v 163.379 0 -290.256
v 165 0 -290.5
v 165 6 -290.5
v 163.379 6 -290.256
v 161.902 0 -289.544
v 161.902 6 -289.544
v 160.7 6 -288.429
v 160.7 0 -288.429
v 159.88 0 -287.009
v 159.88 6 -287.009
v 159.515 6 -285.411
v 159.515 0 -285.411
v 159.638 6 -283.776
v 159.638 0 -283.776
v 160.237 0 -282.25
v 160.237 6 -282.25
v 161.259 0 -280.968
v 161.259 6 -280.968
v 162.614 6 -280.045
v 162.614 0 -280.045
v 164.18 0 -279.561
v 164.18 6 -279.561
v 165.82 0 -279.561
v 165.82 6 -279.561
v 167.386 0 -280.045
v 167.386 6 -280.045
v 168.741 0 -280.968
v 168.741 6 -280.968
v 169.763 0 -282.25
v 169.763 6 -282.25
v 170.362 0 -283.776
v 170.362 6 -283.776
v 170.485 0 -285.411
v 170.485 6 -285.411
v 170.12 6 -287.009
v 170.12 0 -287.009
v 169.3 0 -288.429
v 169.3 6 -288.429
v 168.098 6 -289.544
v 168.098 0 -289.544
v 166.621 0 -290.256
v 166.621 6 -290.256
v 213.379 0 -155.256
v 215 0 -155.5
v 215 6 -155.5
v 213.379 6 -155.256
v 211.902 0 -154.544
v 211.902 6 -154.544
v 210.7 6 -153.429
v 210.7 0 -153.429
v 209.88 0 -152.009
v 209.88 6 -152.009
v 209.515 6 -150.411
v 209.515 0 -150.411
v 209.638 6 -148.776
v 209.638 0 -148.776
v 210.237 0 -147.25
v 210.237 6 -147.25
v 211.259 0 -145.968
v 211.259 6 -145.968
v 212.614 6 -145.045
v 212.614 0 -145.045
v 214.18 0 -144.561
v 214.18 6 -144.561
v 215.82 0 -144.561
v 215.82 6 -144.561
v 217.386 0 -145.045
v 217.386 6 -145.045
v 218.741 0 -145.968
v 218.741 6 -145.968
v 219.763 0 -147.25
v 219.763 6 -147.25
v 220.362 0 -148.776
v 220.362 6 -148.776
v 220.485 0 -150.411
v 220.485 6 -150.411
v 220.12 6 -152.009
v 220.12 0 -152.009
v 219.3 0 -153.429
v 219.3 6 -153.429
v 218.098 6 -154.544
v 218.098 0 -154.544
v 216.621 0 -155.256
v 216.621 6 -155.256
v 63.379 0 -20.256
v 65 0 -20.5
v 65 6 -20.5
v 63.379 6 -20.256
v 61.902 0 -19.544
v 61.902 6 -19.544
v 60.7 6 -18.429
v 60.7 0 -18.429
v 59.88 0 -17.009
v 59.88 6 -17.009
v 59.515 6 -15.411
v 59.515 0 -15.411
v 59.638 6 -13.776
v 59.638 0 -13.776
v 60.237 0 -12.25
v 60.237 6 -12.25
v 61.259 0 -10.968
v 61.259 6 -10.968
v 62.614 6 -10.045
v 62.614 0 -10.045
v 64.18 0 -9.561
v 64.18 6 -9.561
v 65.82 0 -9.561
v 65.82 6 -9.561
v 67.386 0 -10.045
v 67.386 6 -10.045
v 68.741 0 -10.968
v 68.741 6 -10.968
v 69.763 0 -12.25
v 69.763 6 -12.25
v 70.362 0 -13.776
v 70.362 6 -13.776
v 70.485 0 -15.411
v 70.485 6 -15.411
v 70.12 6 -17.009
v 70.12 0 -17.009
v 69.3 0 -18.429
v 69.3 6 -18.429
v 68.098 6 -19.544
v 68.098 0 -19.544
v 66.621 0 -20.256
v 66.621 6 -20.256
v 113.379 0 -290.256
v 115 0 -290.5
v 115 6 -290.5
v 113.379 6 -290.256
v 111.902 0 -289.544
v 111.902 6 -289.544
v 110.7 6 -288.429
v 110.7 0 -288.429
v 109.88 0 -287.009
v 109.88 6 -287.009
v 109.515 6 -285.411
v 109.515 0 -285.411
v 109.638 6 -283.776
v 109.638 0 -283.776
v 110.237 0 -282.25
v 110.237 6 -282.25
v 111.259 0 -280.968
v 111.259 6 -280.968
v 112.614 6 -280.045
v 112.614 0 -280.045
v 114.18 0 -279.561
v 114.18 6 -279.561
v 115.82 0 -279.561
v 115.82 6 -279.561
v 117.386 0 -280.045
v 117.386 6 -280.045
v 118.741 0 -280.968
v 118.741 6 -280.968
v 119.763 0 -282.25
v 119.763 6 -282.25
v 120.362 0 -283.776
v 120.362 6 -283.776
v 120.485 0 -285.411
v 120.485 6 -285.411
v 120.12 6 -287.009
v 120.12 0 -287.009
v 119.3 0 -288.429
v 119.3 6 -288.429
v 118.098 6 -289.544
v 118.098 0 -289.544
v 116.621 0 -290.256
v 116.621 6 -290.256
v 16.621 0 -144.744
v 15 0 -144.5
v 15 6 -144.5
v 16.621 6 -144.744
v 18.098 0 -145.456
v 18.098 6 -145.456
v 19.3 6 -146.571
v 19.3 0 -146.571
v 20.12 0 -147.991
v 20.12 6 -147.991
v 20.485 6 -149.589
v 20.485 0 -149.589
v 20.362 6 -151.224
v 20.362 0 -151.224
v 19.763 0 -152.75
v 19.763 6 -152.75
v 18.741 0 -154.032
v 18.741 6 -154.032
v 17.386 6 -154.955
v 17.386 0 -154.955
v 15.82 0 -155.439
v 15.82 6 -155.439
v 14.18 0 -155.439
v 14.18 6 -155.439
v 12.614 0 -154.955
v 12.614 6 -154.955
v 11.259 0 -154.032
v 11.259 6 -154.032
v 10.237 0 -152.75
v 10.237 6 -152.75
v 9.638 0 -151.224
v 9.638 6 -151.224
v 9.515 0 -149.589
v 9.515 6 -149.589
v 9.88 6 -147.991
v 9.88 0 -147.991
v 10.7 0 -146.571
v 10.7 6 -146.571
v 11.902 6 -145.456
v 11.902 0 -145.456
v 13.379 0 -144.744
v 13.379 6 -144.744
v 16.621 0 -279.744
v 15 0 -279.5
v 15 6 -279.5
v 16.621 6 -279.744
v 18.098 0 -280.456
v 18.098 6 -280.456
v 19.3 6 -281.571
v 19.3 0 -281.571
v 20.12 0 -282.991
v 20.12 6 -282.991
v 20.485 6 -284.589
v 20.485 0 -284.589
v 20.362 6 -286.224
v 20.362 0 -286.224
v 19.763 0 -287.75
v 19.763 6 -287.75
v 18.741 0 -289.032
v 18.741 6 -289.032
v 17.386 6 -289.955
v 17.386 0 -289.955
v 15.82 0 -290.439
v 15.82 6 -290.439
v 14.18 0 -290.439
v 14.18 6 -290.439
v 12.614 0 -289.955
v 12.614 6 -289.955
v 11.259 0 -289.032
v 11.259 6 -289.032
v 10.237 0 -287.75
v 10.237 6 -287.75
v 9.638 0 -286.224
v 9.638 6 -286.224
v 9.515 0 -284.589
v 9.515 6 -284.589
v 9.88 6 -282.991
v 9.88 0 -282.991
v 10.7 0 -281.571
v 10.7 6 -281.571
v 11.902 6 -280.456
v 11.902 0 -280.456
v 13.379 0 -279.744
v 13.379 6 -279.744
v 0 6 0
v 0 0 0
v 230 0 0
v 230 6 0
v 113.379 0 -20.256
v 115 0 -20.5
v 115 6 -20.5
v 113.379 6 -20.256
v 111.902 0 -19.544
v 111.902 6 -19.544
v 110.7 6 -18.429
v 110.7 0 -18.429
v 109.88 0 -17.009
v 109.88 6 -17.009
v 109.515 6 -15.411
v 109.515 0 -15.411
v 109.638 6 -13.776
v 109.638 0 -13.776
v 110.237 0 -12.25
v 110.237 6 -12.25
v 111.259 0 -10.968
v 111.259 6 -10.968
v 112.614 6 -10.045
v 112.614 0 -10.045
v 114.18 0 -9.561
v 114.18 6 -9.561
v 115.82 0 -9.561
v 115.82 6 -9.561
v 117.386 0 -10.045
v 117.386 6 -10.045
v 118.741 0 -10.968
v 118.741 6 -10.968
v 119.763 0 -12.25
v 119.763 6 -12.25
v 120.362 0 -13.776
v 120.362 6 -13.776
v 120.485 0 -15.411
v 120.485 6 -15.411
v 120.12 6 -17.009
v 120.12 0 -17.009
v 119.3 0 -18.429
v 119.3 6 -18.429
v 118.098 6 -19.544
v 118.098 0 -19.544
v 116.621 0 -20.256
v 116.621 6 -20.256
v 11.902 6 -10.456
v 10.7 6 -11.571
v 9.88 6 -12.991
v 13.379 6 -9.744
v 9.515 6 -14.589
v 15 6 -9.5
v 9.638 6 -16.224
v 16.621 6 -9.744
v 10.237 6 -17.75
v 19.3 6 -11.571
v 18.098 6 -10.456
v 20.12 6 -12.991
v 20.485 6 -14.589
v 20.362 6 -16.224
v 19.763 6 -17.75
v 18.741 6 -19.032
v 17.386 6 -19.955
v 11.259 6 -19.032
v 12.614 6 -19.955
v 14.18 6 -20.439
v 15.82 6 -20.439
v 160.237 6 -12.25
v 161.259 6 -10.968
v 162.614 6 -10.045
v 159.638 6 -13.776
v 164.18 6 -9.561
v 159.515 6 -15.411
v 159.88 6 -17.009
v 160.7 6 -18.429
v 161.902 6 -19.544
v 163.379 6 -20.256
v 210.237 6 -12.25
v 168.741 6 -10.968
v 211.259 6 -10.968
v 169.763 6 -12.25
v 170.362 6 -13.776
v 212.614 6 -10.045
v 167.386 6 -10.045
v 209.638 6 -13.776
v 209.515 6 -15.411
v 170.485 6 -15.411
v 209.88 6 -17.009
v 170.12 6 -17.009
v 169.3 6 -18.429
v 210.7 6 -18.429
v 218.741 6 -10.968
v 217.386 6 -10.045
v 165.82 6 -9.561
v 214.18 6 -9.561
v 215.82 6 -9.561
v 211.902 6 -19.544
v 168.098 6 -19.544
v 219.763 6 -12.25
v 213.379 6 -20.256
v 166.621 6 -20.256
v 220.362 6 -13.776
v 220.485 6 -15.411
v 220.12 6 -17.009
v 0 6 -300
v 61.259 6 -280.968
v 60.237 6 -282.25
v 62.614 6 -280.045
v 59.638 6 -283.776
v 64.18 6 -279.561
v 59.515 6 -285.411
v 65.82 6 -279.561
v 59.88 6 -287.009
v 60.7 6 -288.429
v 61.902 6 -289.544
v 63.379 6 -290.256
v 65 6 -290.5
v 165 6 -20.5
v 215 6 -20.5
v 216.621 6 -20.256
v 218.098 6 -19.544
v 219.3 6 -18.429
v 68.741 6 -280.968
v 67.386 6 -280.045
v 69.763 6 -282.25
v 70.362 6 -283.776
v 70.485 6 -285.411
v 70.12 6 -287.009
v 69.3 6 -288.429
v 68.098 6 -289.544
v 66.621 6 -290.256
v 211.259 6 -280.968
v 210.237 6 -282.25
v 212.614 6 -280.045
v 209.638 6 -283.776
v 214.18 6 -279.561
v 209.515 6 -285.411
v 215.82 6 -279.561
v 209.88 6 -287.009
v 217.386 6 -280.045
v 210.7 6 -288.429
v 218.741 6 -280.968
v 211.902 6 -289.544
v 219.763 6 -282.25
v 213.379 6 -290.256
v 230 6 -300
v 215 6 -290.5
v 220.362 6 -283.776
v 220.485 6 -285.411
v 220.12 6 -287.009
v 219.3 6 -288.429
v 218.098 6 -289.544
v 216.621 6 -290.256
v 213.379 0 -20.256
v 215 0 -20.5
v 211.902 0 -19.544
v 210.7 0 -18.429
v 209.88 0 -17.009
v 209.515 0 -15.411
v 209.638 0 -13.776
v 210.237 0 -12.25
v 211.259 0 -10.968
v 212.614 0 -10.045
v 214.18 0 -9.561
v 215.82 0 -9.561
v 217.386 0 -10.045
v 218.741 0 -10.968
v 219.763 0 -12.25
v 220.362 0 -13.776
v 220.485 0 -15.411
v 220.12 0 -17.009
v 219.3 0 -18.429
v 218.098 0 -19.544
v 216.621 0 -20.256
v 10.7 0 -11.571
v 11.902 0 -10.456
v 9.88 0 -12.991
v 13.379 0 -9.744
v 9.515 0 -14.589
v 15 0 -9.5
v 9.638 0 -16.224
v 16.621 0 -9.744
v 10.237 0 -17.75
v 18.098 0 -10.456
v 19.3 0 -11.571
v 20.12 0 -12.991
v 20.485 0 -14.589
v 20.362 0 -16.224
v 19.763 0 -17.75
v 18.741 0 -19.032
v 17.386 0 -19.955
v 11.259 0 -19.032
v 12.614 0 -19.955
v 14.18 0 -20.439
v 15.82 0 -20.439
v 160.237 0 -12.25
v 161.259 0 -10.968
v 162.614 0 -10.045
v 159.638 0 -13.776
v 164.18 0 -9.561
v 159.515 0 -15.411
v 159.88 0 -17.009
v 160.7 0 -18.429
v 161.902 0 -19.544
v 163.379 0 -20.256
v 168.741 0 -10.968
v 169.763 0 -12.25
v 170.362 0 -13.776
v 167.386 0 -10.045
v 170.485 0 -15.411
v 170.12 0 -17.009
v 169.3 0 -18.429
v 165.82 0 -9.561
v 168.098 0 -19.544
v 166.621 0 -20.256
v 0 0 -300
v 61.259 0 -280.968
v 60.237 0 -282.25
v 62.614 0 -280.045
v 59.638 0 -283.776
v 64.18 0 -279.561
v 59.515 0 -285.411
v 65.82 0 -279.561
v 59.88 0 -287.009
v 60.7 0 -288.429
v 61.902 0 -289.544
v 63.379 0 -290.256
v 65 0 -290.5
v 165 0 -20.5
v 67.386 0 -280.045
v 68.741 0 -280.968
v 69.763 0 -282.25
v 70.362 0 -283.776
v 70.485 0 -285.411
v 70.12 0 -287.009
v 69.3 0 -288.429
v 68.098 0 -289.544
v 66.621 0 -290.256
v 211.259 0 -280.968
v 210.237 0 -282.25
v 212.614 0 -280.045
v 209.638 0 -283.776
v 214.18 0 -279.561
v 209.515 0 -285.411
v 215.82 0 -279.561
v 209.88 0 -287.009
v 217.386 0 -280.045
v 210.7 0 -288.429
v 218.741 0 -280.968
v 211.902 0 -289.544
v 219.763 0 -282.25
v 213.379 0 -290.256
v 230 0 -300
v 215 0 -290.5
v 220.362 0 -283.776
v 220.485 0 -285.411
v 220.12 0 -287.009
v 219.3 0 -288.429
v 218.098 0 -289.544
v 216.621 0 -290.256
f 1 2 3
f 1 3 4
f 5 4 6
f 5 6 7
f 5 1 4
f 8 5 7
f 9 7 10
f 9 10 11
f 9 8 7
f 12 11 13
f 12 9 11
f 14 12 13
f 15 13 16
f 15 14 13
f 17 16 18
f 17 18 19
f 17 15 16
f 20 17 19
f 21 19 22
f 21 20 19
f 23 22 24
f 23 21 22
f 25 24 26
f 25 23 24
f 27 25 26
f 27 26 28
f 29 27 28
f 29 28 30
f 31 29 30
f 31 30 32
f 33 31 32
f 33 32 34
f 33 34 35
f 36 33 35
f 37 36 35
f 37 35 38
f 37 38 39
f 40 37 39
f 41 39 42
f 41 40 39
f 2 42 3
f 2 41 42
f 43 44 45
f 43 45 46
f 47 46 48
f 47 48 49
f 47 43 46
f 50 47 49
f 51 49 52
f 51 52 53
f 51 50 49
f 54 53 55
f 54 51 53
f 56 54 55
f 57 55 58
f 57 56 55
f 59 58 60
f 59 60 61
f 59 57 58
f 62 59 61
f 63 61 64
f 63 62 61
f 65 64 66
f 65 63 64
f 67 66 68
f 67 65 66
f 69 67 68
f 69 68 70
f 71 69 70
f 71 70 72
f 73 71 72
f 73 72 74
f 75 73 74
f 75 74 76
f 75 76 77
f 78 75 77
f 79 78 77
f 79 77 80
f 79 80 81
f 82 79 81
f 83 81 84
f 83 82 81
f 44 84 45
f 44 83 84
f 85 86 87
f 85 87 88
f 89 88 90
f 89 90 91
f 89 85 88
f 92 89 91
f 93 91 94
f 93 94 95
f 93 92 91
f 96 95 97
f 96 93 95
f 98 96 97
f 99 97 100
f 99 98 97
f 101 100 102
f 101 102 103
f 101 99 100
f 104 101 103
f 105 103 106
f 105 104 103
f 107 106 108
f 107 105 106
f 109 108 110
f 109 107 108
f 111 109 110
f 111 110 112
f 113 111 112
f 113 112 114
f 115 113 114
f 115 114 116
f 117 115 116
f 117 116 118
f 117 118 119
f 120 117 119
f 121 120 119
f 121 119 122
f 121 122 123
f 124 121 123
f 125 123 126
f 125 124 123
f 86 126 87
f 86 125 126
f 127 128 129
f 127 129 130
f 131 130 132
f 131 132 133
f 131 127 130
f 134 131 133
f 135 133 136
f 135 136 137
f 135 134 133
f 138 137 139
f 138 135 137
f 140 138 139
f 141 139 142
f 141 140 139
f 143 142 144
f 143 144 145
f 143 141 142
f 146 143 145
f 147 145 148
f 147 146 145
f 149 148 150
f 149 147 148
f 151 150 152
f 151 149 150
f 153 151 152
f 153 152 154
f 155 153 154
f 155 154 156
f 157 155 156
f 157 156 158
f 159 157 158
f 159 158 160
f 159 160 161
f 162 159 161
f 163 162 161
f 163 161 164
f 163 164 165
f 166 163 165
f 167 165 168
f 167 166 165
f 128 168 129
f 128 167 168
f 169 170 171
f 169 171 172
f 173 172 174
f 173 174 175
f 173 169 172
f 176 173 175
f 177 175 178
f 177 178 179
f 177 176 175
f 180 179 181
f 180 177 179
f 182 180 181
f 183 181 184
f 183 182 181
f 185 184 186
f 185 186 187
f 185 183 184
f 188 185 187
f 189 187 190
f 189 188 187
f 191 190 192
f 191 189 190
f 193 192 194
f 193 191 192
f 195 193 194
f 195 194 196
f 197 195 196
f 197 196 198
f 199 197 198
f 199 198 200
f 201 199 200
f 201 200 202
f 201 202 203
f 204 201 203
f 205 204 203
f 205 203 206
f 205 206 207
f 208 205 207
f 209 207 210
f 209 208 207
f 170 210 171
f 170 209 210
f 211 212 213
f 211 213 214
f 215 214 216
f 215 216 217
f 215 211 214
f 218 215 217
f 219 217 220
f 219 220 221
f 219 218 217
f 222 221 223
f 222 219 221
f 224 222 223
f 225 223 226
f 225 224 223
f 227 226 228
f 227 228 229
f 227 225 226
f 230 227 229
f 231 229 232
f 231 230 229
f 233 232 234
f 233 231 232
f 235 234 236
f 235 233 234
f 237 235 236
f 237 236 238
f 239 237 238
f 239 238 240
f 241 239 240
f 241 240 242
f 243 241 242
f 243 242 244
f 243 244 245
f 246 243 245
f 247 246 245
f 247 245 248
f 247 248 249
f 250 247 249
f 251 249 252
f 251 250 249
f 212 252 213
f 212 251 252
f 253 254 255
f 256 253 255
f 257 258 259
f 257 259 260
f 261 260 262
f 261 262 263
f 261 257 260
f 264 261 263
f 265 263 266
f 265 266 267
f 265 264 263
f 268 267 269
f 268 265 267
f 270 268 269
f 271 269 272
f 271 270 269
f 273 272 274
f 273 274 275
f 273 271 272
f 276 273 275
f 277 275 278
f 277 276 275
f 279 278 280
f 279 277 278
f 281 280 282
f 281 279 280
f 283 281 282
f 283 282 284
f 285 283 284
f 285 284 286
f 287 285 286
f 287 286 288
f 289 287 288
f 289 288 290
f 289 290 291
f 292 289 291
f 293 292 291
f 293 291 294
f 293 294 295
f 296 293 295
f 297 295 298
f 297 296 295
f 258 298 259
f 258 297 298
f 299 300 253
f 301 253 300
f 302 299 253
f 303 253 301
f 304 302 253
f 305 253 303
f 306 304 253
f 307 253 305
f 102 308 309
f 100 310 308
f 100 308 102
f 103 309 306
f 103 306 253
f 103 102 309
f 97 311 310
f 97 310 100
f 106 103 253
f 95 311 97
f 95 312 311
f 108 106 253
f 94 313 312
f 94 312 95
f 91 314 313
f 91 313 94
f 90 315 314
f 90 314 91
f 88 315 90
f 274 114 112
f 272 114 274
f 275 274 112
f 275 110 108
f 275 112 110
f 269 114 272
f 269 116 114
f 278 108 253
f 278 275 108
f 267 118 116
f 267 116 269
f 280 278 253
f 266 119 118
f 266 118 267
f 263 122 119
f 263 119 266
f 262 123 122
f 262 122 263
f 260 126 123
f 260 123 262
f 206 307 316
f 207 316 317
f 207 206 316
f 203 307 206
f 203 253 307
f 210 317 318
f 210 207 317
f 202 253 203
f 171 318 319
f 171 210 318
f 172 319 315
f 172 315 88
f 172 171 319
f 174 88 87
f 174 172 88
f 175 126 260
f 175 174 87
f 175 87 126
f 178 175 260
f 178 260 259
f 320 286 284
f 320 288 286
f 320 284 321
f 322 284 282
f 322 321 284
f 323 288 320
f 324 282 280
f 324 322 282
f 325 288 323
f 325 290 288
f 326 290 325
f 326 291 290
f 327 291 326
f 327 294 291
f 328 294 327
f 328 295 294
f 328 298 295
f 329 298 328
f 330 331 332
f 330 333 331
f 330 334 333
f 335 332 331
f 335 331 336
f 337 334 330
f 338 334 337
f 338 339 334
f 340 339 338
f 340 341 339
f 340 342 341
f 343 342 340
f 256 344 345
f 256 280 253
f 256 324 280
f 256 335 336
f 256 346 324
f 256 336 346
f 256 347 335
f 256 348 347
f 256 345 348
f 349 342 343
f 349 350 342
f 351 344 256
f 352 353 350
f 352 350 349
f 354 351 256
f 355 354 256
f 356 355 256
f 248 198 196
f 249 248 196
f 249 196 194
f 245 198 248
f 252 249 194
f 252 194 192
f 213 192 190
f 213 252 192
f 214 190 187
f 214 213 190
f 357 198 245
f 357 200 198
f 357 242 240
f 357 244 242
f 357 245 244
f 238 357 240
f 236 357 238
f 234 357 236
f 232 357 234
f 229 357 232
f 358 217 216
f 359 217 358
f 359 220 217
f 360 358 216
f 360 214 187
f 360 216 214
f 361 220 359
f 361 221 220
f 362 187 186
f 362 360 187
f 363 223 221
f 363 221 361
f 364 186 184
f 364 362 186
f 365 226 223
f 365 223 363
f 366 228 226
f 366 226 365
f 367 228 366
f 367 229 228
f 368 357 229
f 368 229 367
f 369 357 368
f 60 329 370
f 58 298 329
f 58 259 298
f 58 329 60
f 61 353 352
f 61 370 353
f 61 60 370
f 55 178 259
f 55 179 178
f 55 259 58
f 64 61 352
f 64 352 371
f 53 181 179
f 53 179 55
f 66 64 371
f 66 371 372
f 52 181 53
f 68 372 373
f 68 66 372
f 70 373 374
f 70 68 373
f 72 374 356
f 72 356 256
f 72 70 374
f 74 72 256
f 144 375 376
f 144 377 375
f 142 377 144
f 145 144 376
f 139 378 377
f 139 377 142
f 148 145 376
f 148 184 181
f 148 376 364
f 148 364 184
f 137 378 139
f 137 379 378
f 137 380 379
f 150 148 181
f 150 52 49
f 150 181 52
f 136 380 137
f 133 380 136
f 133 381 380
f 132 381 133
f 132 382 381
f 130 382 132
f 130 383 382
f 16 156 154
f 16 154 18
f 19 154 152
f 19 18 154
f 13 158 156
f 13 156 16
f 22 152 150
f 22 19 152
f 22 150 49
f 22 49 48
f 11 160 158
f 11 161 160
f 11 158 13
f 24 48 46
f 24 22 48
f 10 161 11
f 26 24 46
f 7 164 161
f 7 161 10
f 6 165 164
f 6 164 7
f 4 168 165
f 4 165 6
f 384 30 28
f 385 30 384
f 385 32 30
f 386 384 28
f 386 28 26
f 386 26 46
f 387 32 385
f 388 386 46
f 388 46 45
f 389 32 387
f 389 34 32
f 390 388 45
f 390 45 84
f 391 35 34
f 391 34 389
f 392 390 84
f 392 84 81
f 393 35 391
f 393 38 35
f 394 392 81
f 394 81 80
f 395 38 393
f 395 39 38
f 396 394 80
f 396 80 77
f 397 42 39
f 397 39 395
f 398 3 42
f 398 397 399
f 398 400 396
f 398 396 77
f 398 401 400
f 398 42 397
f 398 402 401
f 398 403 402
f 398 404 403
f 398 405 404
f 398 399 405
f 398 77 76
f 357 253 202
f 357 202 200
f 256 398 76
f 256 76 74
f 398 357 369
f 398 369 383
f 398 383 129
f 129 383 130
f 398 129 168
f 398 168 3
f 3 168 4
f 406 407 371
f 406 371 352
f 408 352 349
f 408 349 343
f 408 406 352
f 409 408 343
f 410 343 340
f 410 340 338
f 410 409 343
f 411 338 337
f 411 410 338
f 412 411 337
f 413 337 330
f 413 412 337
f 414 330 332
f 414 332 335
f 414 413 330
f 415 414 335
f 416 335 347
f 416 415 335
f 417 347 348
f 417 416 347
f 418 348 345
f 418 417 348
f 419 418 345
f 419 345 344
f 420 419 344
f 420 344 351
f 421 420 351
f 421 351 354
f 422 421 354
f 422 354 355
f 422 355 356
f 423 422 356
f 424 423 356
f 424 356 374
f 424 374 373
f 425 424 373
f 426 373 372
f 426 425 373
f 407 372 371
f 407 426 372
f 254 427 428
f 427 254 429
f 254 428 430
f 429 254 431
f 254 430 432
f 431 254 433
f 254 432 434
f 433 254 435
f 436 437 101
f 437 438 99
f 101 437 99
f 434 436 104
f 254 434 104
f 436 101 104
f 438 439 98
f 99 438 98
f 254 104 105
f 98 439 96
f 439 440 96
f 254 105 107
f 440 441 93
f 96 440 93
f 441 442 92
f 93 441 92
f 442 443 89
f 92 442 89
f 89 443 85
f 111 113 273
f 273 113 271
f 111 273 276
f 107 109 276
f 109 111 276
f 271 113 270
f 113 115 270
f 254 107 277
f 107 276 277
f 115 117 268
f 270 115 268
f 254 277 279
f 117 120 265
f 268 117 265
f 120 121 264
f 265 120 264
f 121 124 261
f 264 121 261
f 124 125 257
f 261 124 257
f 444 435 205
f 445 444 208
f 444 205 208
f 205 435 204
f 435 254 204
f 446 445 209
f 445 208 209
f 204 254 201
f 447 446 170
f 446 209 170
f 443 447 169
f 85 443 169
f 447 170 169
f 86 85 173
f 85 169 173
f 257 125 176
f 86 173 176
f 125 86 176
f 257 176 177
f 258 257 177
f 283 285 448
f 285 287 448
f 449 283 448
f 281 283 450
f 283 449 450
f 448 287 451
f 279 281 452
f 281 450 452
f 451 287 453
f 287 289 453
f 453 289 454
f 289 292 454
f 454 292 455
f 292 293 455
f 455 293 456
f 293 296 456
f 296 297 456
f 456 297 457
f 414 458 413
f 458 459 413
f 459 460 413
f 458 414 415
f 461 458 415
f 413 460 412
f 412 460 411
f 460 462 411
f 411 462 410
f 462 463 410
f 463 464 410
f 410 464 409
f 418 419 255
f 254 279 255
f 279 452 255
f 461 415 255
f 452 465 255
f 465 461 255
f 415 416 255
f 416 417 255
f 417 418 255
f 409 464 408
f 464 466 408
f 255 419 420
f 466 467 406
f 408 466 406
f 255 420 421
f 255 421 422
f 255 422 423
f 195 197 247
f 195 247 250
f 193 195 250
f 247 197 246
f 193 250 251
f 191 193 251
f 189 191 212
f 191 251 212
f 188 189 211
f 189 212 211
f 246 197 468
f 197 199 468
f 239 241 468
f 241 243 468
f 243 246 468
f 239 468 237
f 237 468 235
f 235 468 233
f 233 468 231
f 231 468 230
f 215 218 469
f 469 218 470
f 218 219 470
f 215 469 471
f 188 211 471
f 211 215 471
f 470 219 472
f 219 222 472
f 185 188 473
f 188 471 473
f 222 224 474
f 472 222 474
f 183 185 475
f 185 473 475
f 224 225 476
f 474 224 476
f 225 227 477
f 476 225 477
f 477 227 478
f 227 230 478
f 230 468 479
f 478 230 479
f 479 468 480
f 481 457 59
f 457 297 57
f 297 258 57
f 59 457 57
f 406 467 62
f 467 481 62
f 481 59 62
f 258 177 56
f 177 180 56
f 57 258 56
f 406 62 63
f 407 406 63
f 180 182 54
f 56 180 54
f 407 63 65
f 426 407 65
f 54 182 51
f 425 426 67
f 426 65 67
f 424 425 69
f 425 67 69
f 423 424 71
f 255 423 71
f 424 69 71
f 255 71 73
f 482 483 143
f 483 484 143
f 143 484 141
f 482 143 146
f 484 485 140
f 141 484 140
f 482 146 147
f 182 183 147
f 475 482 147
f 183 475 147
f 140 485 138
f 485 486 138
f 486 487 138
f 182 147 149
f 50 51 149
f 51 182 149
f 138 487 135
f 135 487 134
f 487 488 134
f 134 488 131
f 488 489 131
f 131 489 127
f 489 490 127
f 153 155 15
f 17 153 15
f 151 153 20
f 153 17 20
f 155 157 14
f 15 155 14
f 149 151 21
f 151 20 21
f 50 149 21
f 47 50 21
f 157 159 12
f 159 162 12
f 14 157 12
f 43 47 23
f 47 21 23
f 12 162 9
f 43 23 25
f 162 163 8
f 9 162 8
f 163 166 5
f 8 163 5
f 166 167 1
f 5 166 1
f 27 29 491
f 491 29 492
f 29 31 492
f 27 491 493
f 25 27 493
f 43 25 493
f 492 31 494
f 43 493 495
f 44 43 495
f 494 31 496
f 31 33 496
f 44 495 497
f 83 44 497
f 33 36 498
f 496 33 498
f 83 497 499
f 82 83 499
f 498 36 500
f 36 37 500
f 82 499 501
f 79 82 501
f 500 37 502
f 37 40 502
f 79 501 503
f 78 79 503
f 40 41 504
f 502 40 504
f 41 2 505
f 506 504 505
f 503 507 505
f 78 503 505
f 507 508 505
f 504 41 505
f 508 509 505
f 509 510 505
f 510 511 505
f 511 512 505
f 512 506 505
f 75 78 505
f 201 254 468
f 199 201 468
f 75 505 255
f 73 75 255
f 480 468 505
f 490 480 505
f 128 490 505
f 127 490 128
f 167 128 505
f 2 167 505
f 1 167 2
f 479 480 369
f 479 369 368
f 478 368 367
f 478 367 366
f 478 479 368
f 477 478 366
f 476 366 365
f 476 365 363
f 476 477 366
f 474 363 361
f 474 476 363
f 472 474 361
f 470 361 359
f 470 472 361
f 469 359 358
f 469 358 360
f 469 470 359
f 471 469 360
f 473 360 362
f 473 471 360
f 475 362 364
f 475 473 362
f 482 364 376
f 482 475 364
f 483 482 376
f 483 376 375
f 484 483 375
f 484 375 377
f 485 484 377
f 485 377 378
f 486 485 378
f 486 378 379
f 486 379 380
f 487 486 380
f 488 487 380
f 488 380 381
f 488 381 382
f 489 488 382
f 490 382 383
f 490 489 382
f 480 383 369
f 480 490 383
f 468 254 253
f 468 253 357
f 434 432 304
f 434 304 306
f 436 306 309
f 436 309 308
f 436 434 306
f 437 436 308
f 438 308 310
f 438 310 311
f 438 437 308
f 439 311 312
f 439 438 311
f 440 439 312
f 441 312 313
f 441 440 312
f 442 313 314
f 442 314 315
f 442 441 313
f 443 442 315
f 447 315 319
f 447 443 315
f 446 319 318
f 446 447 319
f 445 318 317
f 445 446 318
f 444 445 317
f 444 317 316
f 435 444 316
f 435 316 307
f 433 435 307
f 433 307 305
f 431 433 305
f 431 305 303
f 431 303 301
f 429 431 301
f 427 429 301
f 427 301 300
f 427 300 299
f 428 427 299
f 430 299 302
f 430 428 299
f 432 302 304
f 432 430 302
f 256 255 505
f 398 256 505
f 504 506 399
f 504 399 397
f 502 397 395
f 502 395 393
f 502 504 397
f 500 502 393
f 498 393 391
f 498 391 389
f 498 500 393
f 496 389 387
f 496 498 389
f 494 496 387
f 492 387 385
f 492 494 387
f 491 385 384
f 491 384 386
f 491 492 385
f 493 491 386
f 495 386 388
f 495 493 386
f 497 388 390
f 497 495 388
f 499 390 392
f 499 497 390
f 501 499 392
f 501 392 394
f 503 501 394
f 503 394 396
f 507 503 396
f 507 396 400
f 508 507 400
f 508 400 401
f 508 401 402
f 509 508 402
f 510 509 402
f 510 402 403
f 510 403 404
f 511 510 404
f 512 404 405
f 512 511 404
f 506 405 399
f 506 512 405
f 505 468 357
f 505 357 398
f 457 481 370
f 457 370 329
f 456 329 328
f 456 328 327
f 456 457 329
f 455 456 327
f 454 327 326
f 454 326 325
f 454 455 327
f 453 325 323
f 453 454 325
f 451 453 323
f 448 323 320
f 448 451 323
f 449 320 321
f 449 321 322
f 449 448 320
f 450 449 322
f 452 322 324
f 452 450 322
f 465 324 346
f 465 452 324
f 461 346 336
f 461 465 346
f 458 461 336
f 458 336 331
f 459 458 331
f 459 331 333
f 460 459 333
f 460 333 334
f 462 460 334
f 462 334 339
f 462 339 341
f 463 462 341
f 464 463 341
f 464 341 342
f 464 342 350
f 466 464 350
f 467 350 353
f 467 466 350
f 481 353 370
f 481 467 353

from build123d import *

# Parameters (mm, degrees)
SKETCH1_W           = 230
SKETCH1_H           = 300
SKETCH1_R           = 5.5
BOSS_EXTRUDE1_DEPTH = 6


with BuildPart() as part:
    # Sketch1 → Boss-Extrude1 (new body)
    with BuildSketch(Plane(origin=(0, 0, 0), x_dir=(1, 0, 0), z_dir=(0, 1, 0))):
        with Locations((115, 150)):
            Rectangle(SKETCH1_W, SKETCH1_H)
        with Locations((15, 15)):
            Circle(SKETCH1_R, mode=Mode.SUBTRACT)
        with Locations((15, 285)):
            Circle(SKETCH1_R, mode=Mode.SUBTRACT)
        with Locations((15, 150)):
            Circle(SKETCH1_R, mode=Mode.SUBTRACT)
        with Locations((215, 15)):
            Circle(SKETCH1_R, mode=Mode.SUBTRACT)
        with Locations((215, 150)):
            Circle(SKETCH1_R, mode=Mode.SUBTRACT)
        with Locations((215, 285)):
            Circle(SKETCH1_R, mode=Mode.SUBTRACT)
        with Locations((165, 15)):
            Circle(SKETCH1_R, mode=Mode.SUBTRACT)
        with Locations((115, 15)):
            Circle(SKETCH1_R, mode=Mode.SUBTRACT)
        with Locations((65, 15)):
            Circle(SKETCH1_R, mode=Mode.SUBTRACT)
        with Locations((165, 285)):
            Circle(SKETCH1_R, mode=Mode.SUBTRACT)
        with Locations((115, 285)):
            Circle(SKETCH1_R, mode=Mode.SUBTRACT)
        with Locations((65, 285)):
            Circle(SKETCH1_R, mode=Mode.SUBTRACT)
    extrude(amount=BOSS_EXTRUDE1_DEPTH)


solid = part.part
